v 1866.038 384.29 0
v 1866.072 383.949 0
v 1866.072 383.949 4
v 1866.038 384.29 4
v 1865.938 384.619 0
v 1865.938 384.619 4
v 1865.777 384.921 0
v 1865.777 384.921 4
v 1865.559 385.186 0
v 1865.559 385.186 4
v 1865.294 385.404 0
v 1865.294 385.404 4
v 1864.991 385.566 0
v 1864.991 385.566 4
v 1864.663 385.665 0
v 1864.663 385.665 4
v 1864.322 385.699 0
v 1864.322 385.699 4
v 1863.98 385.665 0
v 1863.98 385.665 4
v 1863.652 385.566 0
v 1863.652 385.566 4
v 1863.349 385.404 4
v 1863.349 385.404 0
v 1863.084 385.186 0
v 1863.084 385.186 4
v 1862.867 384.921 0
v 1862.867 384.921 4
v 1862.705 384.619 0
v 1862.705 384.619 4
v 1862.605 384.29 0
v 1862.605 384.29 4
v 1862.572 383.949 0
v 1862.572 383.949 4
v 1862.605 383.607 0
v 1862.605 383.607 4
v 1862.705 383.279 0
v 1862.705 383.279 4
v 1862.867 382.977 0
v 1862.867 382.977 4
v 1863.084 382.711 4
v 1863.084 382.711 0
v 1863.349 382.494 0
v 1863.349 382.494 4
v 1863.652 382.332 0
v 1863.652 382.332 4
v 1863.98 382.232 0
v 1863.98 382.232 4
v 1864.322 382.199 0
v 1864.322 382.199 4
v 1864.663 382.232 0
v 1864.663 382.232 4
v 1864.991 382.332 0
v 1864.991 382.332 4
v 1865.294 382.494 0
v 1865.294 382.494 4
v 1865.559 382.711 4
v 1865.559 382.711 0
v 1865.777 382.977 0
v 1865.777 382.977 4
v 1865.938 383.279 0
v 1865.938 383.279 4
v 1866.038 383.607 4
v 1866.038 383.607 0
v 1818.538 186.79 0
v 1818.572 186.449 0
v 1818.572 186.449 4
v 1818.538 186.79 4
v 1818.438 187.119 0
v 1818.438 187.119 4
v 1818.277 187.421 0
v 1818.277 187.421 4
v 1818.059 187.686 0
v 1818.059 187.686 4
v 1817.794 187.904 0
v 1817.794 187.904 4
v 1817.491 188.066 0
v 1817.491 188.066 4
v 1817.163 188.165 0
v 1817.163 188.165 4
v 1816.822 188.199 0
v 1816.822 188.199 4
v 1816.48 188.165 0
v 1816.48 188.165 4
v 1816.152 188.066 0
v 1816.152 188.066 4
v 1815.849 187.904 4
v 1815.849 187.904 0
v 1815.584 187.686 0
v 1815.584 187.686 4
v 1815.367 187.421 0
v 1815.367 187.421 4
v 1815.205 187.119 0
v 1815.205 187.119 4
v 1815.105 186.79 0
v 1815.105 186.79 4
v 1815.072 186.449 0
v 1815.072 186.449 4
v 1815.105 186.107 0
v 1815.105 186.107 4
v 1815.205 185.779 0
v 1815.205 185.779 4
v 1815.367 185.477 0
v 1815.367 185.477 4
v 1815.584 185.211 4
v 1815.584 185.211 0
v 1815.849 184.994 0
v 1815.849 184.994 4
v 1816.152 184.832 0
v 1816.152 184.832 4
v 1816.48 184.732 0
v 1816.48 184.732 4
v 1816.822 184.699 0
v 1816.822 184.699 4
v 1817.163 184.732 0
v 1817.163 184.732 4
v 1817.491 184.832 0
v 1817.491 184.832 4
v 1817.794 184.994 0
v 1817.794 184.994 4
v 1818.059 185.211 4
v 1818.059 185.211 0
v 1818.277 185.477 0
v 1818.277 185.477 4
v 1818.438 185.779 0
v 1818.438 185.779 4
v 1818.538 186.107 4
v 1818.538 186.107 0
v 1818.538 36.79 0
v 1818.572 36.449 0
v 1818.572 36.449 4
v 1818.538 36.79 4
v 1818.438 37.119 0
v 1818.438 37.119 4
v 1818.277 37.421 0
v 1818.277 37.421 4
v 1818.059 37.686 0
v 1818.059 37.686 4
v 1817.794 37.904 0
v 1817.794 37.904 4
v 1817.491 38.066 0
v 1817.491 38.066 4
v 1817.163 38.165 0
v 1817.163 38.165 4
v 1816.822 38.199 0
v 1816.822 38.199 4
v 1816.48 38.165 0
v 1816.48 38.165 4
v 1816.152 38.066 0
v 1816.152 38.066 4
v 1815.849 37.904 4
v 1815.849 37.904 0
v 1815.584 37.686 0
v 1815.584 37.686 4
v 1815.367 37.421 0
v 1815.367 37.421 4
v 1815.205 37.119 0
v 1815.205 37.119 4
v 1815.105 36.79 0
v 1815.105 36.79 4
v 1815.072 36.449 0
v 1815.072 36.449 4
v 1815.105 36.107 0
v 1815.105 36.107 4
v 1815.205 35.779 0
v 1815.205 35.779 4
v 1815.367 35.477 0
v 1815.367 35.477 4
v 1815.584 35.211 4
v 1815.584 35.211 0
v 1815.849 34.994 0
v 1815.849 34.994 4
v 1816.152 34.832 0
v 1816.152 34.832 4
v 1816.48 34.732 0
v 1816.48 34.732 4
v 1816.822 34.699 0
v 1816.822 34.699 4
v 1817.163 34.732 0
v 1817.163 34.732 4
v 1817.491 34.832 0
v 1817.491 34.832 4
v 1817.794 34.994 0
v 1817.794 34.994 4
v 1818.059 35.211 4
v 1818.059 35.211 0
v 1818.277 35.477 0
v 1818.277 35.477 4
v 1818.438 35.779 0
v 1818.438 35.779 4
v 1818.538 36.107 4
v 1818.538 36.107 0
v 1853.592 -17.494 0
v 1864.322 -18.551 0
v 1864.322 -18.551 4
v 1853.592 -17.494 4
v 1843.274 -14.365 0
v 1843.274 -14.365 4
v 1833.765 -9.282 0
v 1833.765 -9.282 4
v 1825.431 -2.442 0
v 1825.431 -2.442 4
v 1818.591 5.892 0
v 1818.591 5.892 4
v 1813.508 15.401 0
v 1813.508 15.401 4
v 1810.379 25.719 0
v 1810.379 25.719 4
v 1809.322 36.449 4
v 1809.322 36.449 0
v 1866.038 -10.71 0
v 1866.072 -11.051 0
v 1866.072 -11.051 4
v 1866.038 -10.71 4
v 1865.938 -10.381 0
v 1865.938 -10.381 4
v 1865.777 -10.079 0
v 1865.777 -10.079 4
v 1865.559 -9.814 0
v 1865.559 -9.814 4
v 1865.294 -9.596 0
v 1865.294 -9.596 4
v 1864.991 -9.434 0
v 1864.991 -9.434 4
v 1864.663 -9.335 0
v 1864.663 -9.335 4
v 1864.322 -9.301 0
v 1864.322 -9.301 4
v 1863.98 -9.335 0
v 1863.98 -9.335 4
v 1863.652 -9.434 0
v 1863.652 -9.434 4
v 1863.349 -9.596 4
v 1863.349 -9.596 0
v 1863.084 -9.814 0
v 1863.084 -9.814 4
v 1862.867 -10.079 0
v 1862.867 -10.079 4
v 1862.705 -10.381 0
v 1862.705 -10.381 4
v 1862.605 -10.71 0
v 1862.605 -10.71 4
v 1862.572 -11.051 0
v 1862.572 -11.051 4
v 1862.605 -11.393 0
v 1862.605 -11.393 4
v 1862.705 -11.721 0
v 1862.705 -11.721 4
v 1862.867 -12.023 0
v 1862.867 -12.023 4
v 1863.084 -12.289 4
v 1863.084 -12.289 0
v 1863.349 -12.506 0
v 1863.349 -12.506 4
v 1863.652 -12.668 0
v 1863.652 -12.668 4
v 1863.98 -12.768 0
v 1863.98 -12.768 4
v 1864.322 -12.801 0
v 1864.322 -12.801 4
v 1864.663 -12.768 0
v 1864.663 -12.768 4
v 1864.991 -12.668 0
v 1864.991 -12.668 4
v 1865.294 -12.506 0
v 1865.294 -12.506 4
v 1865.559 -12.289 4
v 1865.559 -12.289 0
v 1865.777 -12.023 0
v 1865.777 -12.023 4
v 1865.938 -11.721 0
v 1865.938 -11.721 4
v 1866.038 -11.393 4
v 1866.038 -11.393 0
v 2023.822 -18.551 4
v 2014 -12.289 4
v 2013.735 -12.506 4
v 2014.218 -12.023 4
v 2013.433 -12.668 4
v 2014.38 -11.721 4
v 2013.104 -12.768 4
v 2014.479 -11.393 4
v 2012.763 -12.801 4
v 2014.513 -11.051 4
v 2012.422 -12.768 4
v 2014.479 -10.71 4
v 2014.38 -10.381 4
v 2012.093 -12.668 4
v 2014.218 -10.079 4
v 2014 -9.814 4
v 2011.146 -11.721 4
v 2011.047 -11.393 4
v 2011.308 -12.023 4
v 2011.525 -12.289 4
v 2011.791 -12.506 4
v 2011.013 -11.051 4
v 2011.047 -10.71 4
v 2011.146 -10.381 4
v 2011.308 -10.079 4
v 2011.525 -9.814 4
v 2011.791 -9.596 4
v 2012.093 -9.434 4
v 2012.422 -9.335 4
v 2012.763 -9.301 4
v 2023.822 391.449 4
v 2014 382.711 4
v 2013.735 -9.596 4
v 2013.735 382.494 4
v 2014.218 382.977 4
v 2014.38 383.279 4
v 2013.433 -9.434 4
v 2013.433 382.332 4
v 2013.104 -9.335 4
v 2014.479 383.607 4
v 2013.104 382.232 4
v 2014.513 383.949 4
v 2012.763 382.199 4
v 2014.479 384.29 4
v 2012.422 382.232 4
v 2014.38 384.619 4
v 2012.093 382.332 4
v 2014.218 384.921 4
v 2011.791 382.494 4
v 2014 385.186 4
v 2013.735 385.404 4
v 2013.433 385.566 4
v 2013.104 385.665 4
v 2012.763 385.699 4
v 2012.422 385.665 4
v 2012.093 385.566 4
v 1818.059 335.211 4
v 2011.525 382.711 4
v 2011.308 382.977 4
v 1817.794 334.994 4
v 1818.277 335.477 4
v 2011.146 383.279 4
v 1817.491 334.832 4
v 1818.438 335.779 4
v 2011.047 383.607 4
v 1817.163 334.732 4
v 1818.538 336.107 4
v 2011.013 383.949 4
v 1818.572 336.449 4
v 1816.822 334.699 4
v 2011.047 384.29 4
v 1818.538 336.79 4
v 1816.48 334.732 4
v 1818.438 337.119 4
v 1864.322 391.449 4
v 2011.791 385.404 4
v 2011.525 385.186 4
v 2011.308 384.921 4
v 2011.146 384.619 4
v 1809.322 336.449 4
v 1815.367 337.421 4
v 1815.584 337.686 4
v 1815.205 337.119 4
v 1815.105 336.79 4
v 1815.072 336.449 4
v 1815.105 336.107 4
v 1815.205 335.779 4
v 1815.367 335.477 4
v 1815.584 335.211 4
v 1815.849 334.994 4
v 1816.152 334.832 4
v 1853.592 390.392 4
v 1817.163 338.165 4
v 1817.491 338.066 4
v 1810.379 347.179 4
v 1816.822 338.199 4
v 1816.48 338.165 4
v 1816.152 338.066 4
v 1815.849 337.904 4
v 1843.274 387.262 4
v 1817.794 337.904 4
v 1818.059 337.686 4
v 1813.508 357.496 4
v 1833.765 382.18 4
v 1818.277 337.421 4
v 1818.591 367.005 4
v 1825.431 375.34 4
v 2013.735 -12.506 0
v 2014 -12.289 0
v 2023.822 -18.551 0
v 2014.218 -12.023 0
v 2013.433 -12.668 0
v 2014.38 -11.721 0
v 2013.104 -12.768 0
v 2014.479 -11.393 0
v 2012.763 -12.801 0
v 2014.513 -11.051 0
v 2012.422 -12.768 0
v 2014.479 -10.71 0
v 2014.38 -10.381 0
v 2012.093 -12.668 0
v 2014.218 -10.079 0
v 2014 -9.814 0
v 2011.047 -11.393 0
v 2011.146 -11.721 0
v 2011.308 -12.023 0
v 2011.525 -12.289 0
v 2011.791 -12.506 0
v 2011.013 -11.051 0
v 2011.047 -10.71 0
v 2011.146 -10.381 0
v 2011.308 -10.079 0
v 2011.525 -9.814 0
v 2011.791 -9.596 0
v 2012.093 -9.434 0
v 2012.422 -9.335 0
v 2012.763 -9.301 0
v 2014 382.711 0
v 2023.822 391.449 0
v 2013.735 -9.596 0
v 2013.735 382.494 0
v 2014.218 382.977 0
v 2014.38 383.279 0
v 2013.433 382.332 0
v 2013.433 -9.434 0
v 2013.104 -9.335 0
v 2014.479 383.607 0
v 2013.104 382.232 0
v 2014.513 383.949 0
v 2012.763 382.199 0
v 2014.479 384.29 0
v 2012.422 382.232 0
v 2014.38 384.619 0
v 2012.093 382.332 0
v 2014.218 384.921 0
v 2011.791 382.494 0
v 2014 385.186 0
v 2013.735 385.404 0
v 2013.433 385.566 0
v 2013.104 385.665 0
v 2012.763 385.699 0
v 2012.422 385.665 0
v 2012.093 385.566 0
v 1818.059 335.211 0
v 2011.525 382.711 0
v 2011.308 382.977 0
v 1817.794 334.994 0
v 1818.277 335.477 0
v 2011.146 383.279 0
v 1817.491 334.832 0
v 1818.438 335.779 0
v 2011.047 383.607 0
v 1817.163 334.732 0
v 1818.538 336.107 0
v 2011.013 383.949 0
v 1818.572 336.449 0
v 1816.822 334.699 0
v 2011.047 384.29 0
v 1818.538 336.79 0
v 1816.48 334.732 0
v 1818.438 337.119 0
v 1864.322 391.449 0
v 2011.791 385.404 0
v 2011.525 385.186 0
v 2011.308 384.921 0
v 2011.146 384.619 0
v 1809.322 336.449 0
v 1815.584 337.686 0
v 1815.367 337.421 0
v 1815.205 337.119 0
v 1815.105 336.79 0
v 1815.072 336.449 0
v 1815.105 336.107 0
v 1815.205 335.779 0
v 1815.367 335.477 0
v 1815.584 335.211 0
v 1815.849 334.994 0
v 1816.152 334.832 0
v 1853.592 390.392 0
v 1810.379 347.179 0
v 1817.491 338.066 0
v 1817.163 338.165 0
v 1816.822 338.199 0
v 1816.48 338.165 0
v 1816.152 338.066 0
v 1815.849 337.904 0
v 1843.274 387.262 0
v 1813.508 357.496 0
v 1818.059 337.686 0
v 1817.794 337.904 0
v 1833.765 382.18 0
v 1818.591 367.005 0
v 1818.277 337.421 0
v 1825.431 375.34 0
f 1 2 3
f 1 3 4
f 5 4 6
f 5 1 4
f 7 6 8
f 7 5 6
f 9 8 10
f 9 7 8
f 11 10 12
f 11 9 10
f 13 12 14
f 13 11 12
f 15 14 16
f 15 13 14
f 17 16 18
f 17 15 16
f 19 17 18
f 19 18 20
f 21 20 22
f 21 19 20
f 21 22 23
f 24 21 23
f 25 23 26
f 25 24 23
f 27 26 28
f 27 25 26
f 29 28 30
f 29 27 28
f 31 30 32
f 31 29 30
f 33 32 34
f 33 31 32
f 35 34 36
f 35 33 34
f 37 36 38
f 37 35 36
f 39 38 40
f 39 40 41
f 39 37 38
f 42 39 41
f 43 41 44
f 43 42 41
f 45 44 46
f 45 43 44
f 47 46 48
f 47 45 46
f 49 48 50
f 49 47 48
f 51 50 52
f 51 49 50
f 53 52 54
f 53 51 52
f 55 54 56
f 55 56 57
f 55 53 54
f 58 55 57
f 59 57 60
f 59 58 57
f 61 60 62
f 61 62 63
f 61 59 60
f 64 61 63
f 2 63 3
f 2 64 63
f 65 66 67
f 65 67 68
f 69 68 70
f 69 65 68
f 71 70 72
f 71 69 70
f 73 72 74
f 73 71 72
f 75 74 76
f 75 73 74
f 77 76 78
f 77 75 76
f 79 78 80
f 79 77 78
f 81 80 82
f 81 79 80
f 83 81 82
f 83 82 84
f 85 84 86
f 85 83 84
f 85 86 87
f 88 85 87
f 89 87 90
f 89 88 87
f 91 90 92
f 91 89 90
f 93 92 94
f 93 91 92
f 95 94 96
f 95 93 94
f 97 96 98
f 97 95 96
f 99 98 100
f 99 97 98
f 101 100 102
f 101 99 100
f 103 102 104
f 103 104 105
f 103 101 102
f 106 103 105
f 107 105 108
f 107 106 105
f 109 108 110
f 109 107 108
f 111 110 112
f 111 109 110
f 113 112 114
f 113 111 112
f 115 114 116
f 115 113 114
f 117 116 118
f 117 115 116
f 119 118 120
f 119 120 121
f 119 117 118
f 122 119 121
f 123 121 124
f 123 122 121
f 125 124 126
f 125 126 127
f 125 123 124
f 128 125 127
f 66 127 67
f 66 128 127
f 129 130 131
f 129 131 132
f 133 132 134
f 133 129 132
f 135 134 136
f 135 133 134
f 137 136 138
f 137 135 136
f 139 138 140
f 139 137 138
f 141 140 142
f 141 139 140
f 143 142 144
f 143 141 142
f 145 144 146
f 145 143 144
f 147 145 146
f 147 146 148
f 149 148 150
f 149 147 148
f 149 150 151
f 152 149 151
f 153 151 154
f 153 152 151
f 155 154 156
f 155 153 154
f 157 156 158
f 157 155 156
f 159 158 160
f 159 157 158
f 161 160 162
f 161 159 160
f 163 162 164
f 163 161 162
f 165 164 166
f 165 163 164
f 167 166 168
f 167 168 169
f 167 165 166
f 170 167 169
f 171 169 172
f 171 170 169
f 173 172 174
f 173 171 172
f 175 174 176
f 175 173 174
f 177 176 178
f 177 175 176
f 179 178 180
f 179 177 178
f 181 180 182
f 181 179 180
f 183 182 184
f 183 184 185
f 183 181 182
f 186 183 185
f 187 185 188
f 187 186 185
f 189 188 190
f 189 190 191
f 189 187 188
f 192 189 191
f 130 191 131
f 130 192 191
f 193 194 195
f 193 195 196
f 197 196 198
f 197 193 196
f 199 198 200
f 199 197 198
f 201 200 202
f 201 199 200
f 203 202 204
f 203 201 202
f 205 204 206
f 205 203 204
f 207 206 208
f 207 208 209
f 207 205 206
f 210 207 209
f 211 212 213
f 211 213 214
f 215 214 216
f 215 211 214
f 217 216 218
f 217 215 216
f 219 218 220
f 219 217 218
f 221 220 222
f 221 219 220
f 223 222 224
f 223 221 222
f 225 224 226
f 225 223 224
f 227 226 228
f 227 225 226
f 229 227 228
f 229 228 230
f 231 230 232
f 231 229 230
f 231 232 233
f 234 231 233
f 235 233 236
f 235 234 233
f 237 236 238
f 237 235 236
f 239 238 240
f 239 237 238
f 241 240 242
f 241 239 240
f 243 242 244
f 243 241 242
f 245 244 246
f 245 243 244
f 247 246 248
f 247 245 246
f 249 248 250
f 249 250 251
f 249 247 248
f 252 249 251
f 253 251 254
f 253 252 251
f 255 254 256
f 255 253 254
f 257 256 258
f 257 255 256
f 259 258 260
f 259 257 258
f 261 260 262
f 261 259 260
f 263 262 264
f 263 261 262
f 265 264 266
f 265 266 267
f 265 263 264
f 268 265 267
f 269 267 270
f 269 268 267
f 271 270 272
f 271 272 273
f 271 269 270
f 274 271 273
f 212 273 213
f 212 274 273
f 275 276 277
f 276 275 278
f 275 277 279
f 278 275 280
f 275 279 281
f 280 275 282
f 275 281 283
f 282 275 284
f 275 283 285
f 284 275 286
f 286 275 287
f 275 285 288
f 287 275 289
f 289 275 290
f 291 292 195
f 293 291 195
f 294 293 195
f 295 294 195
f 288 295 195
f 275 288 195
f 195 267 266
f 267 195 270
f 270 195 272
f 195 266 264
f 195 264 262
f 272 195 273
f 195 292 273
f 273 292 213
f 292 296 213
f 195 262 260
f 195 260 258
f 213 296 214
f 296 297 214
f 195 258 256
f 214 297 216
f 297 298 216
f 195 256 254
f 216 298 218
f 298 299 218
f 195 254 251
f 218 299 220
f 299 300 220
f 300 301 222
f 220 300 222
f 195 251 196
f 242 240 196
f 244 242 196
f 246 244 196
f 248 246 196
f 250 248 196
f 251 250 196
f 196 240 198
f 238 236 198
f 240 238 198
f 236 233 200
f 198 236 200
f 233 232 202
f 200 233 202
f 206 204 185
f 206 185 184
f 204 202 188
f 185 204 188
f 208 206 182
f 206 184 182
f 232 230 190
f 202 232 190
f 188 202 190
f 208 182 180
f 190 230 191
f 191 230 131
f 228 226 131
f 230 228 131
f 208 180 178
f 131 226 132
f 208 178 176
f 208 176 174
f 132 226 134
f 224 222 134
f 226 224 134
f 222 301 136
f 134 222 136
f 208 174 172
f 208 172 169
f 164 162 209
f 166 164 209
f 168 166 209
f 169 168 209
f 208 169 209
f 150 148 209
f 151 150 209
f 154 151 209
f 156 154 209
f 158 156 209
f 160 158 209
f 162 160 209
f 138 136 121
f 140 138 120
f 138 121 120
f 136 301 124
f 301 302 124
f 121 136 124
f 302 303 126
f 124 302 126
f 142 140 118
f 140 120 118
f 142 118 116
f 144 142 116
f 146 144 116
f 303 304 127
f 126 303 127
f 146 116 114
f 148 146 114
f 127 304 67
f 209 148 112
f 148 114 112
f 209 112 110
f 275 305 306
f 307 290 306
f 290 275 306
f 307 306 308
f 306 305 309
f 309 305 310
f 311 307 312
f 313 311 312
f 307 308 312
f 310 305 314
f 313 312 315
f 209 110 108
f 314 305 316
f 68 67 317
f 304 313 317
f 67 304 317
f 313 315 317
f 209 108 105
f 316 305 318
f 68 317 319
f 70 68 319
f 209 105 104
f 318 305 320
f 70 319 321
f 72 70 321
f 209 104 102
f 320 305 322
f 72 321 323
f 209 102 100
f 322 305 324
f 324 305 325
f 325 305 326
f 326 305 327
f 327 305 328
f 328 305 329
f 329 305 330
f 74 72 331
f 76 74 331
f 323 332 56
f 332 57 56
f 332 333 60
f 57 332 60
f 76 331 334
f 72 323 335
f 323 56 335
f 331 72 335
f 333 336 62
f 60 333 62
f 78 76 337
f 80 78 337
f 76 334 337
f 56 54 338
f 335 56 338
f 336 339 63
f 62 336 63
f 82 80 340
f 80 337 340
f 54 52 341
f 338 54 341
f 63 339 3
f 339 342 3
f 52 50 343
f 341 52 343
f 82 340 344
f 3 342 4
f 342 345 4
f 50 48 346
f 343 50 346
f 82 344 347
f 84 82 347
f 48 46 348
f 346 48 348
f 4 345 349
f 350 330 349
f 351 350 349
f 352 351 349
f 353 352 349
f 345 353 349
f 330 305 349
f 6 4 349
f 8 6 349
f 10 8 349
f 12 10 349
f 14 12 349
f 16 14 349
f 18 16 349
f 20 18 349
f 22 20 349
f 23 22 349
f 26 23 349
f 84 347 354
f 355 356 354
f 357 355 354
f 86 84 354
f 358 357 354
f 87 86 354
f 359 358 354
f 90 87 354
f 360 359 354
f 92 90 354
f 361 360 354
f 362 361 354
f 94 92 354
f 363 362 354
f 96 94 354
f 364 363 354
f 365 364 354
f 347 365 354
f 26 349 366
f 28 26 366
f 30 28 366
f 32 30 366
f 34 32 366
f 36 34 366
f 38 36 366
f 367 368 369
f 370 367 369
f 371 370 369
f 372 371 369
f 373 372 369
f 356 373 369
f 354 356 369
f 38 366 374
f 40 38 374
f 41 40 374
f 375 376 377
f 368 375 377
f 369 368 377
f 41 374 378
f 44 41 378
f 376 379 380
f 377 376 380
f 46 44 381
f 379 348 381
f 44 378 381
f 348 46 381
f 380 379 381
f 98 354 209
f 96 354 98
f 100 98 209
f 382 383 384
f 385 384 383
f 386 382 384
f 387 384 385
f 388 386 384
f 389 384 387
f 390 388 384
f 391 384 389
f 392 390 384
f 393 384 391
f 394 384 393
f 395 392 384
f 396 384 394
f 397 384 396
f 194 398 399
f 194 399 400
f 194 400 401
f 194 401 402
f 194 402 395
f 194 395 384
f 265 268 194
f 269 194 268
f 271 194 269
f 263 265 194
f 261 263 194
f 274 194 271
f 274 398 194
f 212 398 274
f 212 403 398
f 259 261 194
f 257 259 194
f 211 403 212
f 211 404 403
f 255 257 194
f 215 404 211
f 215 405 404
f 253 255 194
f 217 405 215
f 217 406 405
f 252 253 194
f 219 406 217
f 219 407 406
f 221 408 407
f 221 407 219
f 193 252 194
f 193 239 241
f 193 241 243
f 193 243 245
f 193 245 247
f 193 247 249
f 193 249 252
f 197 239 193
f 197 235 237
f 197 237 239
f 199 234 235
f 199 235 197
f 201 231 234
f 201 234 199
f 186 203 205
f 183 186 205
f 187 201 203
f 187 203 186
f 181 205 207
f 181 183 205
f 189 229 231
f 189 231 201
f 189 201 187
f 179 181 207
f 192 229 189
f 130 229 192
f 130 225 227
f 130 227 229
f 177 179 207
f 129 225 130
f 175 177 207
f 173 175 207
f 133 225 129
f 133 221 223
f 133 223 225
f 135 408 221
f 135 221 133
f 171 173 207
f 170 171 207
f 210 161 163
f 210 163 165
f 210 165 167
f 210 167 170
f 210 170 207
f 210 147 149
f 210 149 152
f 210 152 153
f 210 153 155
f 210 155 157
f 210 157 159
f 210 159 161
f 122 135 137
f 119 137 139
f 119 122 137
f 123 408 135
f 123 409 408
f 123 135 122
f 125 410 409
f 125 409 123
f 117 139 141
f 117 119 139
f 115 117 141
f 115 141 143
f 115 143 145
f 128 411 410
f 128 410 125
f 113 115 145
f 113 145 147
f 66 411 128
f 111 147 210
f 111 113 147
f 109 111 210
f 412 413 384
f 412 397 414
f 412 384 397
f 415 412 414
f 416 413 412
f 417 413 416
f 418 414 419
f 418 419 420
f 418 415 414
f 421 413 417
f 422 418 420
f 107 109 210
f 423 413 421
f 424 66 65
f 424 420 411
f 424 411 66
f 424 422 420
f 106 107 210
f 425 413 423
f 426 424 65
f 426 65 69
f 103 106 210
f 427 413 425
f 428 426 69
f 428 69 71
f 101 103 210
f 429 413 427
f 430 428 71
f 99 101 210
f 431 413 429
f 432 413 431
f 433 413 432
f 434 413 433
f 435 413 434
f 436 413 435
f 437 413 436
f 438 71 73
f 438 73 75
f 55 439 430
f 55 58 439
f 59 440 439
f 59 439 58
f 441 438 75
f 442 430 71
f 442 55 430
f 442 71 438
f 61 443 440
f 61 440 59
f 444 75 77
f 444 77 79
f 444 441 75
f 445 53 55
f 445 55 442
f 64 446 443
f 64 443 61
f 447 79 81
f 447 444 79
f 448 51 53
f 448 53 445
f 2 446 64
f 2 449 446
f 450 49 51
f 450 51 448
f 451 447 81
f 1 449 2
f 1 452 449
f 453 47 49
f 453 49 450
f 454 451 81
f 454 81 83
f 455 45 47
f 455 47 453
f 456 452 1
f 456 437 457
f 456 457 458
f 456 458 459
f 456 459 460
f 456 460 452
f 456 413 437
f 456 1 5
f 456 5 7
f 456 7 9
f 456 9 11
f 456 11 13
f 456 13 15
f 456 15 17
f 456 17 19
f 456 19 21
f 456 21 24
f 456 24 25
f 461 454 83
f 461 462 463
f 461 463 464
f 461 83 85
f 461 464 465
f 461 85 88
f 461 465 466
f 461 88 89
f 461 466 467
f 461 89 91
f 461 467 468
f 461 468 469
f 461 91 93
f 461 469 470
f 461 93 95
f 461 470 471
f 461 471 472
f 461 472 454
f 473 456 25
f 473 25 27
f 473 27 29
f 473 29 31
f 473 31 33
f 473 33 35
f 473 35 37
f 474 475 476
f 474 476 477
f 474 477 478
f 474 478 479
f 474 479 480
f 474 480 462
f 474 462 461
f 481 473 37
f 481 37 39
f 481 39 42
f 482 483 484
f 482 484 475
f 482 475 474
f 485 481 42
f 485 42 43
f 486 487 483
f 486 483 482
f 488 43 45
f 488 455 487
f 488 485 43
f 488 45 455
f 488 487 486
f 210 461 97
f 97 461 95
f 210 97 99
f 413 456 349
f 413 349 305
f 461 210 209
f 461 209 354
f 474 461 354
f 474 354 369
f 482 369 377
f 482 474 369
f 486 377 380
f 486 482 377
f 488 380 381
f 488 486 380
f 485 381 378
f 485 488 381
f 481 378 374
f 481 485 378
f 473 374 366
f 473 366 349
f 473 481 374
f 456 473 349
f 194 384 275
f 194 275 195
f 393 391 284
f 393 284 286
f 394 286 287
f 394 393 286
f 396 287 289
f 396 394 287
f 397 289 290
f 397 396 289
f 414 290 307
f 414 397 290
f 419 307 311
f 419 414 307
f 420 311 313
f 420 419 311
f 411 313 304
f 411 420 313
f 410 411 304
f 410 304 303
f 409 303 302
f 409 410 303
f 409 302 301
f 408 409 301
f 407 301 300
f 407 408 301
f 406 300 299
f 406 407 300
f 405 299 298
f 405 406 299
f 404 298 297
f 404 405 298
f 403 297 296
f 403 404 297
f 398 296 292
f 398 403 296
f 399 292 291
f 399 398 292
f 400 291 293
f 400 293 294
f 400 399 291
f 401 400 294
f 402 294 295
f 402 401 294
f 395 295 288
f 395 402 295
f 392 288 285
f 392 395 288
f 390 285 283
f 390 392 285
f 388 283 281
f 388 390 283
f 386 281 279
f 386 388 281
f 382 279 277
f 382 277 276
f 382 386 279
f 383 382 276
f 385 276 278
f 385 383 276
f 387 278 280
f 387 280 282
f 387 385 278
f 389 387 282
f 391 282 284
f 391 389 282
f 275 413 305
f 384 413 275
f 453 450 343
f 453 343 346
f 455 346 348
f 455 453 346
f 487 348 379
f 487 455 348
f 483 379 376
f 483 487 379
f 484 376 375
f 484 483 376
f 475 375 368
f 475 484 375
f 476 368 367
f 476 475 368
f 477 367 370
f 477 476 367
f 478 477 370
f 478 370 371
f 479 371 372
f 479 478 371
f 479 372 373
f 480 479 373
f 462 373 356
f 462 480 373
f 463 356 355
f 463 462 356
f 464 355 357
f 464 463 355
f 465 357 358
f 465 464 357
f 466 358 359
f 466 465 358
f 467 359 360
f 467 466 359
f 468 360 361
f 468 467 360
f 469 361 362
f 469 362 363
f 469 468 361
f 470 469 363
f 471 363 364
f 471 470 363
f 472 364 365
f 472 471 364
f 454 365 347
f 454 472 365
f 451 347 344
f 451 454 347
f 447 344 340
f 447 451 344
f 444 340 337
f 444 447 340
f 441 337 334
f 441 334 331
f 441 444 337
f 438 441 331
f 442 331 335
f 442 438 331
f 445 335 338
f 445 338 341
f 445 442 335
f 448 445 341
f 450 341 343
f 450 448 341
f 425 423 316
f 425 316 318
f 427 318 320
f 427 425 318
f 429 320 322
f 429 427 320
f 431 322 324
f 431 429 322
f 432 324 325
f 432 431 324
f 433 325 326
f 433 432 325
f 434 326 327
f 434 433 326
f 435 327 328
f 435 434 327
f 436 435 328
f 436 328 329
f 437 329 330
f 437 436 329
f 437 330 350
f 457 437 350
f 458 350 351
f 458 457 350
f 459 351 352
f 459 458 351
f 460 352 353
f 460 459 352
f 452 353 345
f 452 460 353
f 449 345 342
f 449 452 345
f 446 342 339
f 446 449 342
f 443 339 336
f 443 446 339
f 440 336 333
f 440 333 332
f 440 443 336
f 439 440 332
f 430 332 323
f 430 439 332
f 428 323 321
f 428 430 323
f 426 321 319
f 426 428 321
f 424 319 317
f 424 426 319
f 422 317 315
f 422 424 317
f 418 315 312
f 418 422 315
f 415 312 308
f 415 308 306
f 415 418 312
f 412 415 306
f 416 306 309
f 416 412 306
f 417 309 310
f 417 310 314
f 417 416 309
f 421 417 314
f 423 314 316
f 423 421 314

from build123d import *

# Parameters (mm, degrees)
SKETCH1_R           = 1.75
BOSS_EXTRUDE1_DEPTH = 4


with BuildPart() as part:
    # Sketch1 → Boss-Extrude1 (new body)
    with BuildSketch(Plane.XY):
        with BuildLine():
            Line((2023.821699886, 391.448846192), (2023.821699886, -18.551153808))
            Line((2023.821699886, -18.551153808), (1864.321699886, -18.551153808))
            ThreePointArc((1864.321699886, -18.551153808), (1825.430826921, -2.442026773), (1809.321699886, 36.448846192))
            Line((1809.321699886, 36.448846192), (1809.321699886, 336.448846192))
            ThreePointArc((1809.321699886, 336.448846192), (1825.430826921, 375.339719157), (1864.321699886, 391.448846192))
            Line((1864.321699886, 391.448846192), (2023.821699886, 391.448846192))
        make_face()
        with Locations((2012.76292798, -11.051153808)):
            Circle(SKETCH1_R, mode=Mode.SUBTRACT)
        with Locations((1864.321699886, -11.051153808)):
            Circle(SKETCH1_R, mode=Mode.SUBTRACT)
        with Locations((1816.821699886, 36.448846192)):
            Circle(SKETCH1_R, mode=Mode.SUBTRACT)
        with Locations((1816.821699886, 186.448846192)):
            Circle(SKETCH1_R, mode=Mode.SUBTRACT)
        with Locations((1816.821699886, 336.448846192)):
            Circle(SKETCH1_R, mode=Mode.SUBTRACT)
        with Locations((1864.321699886, 383.948846192)):
            Circle(SKETCH1_R, mode=Mode.SUBTRACT)
        with Locations((2012.76292798, 383.948846192)):
            Circle(SKETCH1_R, mode=Mode.SUBTRACT)
    extrude(amount=BOSS_EXTRUDE1_DEPTH)


solid = part.part
